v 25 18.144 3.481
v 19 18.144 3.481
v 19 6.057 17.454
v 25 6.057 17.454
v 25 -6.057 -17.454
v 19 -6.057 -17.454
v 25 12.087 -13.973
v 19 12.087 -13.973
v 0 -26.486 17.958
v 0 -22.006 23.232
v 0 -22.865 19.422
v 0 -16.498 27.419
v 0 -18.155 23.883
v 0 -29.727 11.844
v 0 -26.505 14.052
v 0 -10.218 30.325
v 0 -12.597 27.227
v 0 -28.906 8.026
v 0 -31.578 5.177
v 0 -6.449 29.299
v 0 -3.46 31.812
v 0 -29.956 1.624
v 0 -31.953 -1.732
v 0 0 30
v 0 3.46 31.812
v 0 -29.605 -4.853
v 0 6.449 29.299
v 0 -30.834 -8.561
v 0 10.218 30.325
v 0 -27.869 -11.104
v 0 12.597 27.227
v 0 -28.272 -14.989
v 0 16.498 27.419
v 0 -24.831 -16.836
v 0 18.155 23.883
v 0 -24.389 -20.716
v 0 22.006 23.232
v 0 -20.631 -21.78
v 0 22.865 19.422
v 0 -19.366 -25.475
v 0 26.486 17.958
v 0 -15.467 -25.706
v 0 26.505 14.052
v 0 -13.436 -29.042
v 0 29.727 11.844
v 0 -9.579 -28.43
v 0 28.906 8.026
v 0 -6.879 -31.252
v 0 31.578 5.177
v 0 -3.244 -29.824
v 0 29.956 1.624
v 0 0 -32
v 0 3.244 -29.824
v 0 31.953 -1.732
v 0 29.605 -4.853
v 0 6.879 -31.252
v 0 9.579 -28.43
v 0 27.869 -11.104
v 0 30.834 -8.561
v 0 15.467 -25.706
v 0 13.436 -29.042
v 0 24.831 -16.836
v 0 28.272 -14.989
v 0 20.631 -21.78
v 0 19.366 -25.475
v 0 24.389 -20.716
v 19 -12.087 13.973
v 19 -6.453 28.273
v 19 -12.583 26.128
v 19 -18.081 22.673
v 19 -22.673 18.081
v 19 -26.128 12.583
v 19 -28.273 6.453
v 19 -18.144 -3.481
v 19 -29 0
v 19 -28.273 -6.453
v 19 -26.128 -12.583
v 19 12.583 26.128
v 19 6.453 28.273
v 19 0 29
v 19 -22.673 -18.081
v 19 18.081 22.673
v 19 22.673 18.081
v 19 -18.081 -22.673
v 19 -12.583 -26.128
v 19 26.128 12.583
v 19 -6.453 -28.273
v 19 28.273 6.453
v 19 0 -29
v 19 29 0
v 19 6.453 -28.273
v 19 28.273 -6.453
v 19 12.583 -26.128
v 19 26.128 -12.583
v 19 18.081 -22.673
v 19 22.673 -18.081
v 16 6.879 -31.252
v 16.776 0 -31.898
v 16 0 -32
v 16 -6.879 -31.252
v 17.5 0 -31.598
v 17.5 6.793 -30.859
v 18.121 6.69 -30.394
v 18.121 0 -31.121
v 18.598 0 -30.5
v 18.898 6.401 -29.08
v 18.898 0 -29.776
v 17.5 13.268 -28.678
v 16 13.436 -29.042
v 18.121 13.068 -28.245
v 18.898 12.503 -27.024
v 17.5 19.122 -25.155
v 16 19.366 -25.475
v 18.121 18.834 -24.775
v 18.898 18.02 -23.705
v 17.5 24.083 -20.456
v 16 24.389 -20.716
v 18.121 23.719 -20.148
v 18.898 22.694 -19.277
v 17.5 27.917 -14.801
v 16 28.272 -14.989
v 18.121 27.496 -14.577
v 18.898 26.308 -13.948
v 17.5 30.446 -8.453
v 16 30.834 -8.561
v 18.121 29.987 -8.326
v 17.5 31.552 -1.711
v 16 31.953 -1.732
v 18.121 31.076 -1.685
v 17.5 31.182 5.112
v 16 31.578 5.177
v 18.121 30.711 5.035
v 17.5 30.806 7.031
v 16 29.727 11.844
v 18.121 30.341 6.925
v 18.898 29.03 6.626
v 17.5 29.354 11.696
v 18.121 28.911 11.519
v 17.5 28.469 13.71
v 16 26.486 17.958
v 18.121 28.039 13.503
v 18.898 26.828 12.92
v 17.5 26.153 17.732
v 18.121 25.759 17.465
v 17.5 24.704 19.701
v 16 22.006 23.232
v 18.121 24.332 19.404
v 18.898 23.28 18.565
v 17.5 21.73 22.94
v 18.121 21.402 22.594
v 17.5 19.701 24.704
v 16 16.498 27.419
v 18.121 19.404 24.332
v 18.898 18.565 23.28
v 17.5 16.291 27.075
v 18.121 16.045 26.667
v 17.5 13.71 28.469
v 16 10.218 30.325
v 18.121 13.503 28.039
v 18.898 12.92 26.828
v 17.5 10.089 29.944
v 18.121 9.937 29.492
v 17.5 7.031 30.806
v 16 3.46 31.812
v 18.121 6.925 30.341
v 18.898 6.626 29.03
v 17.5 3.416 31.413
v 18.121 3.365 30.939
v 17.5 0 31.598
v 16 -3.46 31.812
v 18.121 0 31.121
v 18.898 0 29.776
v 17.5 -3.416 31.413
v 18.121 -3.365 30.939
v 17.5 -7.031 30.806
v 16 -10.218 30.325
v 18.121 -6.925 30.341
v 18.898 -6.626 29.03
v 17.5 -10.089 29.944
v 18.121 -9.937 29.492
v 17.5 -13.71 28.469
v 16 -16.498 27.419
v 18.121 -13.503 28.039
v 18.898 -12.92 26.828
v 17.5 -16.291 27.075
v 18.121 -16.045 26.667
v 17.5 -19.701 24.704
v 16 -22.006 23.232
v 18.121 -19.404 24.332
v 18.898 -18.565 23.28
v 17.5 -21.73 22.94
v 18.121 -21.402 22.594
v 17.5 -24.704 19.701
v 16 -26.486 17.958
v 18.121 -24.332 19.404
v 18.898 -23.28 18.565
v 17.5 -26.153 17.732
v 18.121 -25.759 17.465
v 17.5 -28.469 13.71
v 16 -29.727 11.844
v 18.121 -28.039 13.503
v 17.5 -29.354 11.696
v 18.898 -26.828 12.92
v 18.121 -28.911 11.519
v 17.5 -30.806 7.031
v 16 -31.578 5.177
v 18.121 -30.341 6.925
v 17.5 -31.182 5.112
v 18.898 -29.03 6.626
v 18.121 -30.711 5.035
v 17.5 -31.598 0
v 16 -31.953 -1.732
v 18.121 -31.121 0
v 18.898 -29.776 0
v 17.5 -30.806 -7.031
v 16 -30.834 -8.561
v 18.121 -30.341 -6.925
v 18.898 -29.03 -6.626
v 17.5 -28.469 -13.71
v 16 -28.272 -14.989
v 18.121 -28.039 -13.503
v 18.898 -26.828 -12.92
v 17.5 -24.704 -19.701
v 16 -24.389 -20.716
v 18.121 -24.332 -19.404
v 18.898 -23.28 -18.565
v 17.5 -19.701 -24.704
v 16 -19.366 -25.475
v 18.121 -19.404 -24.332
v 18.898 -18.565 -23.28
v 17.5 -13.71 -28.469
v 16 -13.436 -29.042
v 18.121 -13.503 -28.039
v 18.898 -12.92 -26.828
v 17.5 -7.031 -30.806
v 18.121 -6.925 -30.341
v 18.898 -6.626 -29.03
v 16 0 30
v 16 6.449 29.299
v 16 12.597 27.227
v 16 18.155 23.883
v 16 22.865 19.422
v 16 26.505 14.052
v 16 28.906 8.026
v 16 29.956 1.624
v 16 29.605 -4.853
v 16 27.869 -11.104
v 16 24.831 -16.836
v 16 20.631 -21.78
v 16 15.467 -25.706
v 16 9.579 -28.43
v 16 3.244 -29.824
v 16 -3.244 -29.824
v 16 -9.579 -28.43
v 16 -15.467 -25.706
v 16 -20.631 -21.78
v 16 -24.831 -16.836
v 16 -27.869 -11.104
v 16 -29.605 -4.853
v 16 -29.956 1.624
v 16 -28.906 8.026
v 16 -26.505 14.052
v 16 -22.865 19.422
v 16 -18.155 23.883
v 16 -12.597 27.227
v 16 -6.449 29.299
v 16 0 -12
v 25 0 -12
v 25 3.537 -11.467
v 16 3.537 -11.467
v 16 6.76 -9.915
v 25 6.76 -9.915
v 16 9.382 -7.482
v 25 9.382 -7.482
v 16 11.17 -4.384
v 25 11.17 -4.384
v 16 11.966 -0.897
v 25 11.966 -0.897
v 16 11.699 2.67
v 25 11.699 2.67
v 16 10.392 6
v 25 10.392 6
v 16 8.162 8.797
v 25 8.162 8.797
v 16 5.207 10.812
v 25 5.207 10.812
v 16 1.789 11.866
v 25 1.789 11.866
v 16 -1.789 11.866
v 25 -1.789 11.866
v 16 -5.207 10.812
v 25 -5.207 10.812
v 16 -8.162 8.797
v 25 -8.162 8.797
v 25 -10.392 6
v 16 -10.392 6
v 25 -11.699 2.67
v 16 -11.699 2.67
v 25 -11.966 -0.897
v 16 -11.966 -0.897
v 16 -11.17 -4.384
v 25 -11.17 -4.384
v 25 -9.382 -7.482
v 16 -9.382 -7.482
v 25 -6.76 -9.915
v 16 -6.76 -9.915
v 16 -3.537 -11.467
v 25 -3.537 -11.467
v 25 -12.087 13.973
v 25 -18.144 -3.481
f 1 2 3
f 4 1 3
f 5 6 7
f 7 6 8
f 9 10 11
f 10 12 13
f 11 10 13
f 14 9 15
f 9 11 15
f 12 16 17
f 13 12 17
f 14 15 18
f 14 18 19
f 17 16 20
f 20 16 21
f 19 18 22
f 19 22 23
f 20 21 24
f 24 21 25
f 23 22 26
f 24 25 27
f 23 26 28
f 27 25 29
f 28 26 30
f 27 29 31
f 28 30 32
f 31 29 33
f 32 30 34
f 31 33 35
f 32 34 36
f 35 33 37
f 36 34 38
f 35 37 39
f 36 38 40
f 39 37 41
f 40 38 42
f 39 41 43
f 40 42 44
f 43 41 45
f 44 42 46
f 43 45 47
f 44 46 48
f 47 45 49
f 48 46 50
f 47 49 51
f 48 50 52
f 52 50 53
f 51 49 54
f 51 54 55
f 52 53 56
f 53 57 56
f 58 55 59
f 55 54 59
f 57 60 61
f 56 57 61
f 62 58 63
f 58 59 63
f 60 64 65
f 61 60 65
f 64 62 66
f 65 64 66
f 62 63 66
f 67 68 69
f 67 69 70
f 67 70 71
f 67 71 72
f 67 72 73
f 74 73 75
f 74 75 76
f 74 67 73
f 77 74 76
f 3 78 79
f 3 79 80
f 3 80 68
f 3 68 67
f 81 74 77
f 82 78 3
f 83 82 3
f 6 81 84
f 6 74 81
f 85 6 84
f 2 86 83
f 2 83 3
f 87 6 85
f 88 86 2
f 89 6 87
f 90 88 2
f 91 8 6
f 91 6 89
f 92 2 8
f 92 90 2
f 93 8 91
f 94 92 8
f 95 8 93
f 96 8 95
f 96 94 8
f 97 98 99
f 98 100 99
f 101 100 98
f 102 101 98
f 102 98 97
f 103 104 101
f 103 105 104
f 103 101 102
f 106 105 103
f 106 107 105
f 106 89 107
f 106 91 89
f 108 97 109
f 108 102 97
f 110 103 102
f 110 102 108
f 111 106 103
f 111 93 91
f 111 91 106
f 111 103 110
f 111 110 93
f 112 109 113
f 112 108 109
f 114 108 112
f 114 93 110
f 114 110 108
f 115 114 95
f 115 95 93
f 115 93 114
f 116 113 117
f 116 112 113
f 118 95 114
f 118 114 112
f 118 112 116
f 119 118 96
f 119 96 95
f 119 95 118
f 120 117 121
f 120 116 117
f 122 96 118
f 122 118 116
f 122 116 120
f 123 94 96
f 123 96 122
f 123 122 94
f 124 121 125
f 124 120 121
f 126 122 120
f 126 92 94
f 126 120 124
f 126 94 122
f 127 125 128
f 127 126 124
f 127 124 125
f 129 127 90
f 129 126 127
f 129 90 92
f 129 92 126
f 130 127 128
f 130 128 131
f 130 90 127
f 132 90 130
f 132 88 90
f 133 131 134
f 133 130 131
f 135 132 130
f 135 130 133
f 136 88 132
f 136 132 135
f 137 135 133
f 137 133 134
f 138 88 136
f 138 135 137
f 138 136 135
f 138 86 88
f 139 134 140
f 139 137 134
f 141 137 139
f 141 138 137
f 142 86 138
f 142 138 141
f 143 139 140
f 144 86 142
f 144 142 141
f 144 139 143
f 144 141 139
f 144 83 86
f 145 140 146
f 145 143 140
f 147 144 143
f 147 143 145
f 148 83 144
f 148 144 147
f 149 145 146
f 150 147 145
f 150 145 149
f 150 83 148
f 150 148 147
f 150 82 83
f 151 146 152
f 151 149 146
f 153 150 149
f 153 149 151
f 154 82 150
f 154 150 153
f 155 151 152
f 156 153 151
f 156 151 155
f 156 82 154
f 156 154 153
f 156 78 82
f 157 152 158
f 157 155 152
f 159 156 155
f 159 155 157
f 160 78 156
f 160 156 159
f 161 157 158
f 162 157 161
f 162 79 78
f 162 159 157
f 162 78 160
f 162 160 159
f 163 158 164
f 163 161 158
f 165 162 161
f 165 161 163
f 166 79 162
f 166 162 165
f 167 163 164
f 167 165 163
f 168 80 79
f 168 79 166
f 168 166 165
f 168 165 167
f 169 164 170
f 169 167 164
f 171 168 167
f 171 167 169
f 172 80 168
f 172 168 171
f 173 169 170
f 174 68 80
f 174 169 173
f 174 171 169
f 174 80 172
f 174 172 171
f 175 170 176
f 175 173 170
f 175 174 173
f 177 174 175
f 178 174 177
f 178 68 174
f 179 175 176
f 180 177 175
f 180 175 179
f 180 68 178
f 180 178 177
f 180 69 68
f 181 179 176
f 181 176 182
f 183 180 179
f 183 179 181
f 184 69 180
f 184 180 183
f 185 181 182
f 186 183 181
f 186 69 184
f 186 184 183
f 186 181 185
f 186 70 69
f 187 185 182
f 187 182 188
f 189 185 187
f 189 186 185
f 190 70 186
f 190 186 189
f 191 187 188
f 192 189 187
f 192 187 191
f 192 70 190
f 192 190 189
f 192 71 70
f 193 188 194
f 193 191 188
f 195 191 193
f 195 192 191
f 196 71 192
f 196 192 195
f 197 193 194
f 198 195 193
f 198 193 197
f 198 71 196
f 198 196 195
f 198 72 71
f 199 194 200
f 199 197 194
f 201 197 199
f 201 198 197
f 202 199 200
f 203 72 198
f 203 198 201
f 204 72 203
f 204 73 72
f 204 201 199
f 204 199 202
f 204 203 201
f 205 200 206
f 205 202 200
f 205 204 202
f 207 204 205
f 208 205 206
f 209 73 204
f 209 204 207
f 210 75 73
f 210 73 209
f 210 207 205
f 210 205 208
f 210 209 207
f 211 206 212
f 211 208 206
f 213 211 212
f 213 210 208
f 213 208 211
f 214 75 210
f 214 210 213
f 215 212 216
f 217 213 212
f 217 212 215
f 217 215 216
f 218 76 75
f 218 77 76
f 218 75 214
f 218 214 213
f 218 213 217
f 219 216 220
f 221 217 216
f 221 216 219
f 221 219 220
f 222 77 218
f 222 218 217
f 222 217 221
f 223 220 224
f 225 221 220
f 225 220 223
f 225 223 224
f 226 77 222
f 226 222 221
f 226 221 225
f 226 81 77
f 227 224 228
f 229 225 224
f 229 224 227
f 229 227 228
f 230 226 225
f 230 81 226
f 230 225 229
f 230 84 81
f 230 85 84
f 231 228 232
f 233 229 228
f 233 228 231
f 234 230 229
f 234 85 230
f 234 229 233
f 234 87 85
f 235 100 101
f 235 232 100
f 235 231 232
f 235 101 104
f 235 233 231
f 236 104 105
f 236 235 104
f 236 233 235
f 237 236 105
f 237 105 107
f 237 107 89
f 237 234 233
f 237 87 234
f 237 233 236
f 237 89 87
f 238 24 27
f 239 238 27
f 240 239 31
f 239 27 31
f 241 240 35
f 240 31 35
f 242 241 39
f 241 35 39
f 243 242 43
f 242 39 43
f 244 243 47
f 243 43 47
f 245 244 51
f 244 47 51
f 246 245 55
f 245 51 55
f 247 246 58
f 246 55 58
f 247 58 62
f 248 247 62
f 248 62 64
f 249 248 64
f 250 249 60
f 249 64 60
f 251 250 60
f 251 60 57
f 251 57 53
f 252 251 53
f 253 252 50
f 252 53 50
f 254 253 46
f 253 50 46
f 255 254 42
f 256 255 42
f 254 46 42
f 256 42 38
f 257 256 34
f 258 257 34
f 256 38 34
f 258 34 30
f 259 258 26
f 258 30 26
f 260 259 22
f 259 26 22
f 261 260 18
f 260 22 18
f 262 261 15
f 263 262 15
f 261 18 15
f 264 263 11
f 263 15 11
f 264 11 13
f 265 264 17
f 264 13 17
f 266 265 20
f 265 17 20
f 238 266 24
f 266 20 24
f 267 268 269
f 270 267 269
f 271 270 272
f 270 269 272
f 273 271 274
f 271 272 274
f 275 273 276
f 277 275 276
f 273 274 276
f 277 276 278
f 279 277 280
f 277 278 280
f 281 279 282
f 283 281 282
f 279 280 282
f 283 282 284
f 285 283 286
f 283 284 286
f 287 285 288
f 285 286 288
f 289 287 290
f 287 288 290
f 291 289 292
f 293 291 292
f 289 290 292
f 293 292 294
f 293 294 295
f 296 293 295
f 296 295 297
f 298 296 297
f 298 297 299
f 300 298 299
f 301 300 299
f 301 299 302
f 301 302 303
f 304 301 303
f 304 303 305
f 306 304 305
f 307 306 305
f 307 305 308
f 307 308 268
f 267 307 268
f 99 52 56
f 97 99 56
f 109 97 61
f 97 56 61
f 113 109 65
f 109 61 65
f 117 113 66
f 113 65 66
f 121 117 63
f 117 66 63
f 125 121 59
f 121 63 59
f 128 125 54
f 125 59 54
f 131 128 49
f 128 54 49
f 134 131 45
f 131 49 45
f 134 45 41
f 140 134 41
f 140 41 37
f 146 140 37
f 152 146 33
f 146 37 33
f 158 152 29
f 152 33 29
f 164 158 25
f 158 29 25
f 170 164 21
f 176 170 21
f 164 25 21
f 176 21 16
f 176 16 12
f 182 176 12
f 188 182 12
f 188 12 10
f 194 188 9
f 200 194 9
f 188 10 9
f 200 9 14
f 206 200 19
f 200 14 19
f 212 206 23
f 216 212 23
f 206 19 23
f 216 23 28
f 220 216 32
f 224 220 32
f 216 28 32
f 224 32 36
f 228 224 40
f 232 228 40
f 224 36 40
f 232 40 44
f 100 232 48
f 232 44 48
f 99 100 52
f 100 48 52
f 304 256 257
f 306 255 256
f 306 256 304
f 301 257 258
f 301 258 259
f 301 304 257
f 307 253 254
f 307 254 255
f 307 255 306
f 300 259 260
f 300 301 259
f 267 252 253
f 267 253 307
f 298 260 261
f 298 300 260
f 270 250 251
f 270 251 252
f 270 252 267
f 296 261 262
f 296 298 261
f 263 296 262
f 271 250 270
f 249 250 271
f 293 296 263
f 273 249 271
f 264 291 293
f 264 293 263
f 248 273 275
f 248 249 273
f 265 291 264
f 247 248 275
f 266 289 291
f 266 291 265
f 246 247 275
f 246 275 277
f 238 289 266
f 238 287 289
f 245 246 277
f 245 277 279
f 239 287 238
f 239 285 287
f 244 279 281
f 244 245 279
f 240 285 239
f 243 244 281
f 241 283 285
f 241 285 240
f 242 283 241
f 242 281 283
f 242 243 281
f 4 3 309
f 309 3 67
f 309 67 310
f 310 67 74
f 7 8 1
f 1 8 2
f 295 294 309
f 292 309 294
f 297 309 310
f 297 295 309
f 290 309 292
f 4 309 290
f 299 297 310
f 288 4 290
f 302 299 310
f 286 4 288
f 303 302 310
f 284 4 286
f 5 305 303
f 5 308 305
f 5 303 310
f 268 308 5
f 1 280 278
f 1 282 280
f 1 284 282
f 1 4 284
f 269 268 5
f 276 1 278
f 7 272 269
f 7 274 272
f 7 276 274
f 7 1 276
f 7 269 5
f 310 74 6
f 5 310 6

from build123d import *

# Parameters (mm, degrees)
SKETCH1_R           = 32
BOSS_EXTRUDE1_DEPTH = 19
SKETCH5_R           = 30
CUT_EXTRUDE1_DEPTH  = 16
FILLET1_R           = 3
BOSS_EXTRUDE2_DEPTH = 6
SKETCH7_R           = 12
CUT_EXTRUDE2_DEPTH  = 26


with BuildPart() as part:
    # Sketch1 → Boss-Extrude1 (new body)
    with BuildSketch(Plane(origin=(0, 0, 0), x_dir=(0, 0, -1), z_dir=(1, 0, 0))):
        Circle(SKETCH1_R)
    extrude(amount=BOSS_EXTRUDE1_DEPTH)

    # Sketch5 → Cut-Extrude1 (cut)
    with BuildSketch(Plane.ZY):
        Circle(SKETCH5_R)
    extrude(amount=-CUT_EXTRUDE1_DEPTH, mode=Mode.SUBTRACT)

    # Fillet1
    fillet1_edges = [part.edges().sort_by_distance(p)[0] for p in [
        (19, 0, 32),
    ]]
    fillet(fillet1_edges, radius=FILLET1_R)

    # Sketch6 → Boss-Extrude2 (add)
    with BuildSketch(Plane(origin=(19, 0, 0), x_dir=(0, 0, -1), z_dir=(1, 0, 0))):
        Polygon((-17.454071761, 6.057120794), (-13.972656361, -12.087109147), (3.481415399, -18.144229941), (17.454071761, -6.057120794), (13.972656361, 12.087109147), (-3.481415399, 18.144229941), align=None)
    extrude(amount=BOSS_EXTRUDE2_DEPTH)

    # Sketch7 → Cut-Extrude2 (cut, through all)
    with BuildSketch(Plane(origin=(25, 0, 0), x_dir=(0, 0, -1), z_dir=(1, 0, 0))):
        Circle(SKETCH7_R)
    extrude(amount=-CUT_EXTRUDE2_DEPTH, mode=Mode.SUBTRACT)


solid = part.part
